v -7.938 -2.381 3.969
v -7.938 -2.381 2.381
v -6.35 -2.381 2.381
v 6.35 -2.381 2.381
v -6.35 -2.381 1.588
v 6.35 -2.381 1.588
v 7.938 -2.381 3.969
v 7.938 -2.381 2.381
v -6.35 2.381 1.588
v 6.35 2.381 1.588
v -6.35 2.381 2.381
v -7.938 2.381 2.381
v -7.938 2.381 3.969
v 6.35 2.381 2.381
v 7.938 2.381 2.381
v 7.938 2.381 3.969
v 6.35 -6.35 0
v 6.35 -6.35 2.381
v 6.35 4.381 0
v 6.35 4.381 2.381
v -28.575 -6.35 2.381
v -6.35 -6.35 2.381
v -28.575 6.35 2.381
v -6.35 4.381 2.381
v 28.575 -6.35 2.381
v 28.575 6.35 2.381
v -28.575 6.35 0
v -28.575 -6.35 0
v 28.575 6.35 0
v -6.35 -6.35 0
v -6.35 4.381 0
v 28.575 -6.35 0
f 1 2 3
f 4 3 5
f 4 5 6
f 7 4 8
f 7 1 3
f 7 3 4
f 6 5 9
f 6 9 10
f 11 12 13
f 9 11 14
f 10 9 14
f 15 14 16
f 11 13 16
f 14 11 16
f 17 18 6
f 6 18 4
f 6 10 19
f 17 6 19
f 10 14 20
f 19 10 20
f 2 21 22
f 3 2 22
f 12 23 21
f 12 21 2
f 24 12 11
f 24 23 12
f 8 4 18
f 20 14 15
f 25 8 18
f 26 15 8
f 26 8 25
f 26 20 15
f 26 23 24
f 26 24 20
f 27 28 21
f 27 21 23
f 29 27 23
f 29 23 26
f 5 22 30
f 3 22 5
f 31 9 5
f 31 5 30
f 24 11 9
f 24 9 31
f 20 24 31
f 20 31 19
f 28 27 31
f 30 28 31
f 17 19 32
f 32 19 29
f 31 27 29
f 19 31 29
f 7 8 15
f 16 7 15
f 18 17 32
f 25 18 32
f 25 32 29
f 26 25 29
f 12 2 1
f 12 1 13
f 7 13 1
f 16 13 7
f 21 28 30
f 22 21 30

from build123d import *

# Parameters (mm, degrees)
F0_W      = 57.15
F0_H      = 12.7
F1_DEPTH  = 2.38125
F2_W      = 15.875
F2_H      = 4.7625
F3_DEPTH  = 1.5875
F5_W      = 12.7
F5_H      = 4.7625
F6_DEPTH  = 3.175
F7_W      = 12.7
F7_H      = 3.96875
F8_DEPTH  = 2.38225
F9_W      = 12.7
F9_H      = 2
F10_DEPTH = 2.38225
F11_W     = 12.7
F11_H     = 4.7625
F12_DEPTH = 1.5875


# Not quite as in the source:
# - a feature of the source that left no trace in its solid (it failed there, or was rolled back) is left out
# - a length typed as a fraction of an inch, garbled in the dataset ("3 / 203.2 mm" for 3/8 in), is restored


with BuildPart() as f1:
    # F0 (on Top) → F1 (new body)
    with BuildSketch(Plane.XY):
        Rectangle(F0_W, F0_H)
    extrude(amount=F1_DEPTH)

    # F2 (on face) → F3 (join)
    with BuildSketch(Plane.XY.offset(2.38125)):
        Rectangle(F2_W, F2_H)
    extrude(amount=F3_DEPTH)

    # F5 (on offset) → F6 (cut, through all)
    with BuildSketch(Plane.XY.offset(3.175)):
        Rectangle(F5_W, F5_H)
    extrude(amount=-F6_DEPTH, mode=Mode.SUBTRACT)

    # F7 (on face) → F8 (cut, through all)
    with BuildSketch(Plane.XY.offset(2.38125)):
        with Locations((0, -4.365625)):
            Rectangle(F7_W, F7_H)
    extrude(amount=-F8_DEPTH, mode=Mode.SUBTRACT)

    # F9 (on face) → F10 (cut, through all)
    with BuildSketch(Plane.XY.offset(2.38125)):
        with Locations((0, 3.38125)):
            Rectangle(F9_W, F9_H)
    extrude(amount=-F10_DEPTH, mode=Mode.SUBTRACT)

    # F11 (on face) → F12 (join)
    with BuildSketch(Plane(origin=(0, 0, 3.175), x_dir=(1, 0, 0), z_dir=(0, 0, -1))):
        Rectangle(F11_W, F11_H)
    extrude(amount=F12_DEPTH)


solid = f1.part
